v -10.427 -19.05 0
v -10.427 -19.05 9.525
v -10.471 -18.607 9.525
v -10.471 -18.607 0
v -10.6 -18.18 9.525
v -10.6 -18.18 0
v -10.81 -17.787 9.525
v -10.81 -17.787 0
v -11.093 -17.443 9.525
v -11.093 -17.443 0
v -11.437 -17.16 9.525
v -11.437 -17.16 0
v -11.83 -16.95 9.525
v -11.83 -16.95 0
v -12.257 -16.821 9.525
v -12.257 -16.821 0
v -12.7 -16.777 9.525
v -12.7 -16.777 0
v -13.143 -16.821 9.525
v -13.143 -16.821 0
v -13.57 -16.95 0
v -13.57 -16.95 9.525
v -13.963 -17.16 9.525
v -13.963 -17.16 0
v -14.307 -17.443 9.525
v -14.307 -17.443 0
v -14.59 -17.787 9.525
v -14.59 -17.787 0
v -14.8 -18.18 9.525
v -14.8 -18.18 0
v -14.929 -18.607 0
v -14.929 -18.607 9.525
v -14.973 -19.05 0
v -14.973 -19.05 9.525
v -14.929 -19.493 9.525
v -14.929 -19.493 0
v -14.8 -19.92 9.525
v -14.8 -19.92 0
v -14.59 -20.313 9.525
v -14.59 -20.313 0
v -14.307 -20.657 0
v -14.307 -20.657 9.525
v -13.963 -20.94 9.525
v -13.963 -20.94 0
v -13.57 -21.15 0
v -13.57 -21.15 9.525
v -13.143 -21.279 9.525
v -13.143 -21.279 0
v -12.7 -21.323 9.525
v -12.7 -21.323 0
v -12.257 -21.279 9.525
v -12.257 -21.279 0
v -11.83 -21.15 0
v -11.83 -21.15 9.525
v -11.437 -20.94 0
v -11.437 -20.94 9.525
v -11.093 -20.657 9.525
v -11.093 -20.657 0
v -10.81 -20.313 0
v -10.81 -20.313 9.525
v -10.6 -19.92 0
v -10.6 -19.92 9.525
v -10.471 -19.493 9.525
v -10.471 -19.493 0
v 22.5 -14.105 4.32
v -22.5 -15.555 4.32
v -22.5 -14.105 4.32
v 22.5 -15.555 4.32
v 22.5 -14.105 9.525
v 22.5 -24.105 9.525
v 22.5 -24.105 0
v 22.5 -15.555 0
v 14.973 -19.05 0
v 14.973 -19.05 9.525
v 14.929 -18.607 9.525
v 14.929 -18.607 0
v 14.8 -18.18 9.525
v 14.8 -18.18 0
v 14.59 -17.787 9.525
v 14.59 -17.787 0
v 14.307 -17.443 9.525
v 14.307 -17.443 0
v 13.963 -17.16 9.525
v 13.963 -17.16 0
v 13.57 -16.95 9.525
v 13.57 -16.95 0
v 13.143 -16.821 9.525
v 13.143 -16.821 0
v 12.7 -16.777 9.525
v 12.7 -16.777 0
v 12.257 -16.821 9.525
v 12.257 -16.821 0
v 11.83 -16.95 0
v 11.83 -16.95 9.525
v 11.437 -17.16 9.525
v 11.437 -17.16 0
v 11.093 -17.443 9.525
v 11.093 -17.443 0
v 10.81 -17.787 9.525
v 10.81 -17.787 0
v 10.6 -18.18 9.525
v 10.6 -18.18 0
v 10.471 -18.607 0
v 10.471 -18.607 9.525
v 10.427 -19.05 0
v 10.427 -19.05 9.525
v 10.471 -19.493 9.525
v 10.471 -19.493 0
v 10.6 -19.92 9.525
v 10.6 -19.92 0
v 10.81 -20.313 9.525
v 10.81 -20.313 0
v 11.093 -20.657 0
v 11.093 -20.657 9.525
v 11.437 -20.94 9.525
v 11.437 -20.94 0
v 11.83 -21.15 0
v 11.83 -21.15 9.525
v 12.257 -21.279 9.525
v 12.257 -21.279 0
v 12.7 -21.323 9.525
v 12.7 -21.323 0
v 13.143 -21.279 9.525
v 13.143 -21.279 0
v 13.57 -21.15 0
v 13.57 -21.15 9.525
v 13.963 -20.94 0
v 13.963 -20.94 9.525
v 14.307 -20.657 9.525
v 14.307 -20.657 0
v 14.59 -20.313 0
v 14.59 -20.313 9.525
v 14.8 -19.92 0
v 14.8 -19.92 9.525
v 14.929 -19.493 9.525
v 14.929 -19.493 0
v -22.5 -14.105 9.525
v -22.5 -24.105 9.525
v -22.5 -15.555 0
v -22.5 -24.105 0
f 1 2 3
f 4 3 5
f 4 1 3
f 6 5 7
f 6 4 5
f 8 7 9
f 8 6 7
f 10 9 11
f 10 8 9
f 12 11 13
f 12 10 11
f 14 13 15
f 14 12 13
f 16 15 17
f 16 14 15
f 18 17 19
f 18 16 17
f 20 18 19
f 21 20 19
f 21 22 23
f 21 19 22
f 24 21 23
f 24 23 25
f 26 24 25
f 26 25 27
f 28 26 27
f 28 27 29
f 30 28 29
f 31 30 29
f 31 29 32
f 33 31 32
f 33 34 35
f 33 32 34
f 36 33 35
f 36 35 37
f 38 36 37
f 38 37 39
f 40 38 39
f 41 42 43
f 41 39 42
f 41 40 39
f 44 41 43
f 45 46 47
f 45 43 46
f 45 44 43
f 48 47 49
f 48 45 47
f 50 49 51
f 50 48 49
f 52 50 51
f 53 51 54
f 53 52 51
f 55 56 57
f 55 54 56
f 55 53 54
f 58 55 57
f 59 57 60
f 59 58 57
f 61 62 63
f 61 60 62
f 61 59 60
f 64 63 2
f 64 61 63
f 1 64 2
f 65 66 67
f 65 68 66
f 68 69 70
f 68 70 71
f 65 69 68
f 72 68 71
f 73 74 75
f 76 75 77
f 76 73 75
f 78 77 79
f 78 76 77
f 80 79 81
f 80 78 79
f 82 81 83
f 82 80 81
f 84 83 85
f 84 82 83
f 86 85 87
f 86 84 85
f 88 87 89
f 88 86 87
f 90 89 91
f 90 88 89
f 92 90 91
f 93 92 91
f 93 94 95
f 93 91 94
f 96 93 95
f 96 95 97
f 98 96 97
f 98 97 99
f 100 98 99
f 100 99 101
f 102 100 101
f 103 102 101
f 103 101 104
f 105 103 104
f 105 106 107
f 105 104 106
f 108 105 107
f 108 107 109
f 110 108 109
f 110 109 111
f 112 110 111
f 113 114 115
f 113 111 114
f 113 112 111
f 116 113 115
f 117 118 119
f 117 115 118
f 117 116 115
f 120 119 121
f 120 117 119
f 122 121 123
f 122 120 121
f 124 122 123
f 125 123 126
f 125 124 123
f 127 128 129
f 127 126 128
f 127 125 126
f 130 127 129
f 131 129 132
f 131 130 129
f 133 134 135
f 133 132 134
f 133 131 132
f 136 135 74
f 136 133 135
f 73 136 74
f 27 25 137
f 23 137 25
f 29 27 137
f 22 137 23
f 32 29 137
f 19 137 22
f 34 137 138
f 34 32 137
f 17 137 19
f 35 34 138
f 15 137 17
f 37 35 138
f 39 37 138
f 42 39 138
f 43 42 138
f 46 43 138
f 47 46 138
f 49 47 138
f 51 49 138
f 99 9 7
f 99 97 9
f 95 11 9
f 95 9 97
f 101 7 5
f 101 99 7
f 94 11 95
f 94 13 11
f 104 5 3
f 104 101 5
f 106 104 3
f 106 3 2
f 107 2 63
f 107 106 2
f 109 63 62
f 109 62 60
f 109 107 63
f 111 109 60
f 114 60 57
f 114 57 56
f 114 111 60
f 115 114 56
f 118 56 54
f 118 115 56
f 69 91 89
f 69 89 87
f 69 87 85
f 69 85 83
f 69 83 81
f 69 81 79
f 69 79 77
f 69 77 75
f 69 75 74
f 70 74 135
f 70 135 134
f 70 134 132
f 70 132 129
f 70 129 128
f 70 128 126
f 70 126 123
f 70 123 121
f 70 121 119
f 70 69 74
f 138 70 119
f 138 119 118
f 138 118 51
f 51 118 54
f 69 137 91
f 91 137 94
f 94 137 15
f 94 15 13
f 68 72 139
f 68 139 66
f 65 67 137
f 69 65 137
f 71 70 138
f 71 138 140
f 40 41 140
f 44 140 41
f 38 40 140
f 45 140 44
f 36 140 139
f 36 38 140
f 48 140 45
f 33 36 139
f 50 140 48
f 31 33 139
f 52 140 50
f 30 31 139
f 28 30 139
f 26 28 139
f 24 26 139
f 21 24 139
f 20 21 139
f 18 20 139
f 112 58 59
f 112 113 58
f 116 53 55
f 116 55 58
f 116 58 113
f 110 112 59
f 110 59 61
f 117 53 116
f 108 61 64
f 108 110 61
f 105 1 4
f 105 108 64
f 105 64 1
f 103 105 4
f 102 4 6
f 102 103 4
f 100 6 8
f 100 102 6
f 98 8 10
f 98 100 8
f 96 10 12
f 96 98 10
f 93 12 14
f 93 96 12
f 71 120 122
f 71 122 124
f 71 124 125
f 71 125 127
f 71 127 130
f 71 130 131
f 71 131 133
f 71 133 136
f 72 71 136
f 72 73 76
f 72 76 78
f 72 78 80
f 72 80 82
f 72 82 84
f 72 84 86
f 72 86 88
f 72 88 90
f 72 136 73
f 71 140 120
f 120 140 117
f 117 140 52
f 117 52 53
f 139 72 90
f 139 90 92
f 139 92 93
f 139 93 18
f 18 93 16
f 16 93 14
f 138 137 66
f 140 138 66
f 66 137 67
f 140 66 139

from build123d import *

# Parameters (mm, degrees)
BOSS_EXTRUDE1_DEPTH  = 22.5
MOUNTHOLES_SKETCH_R  = 2.2729
MOUNTHOLES_CUT_DEPTH = 35.322392836


with BuildPart() as part:
    # yExtentCalculator_sketch → Boss-Extrude1 (new, symmetric)
    with BuildSketch(Plane(origin=(0, 0, 0), x_dir=(0, 0, -1), z_dir=(1, 0, 0))):
        Polygon((-9.525, -14.105), (-9.525, -24.105), (0, -24.105), (0, -15.555), (-4.32, -15.555), (-4.32, -14.105), align=None)
    extrude(amount=BOSS_EXTRUDE1_DEPTH, both=True)

    # mountHoles_sketch → mountHoles_cut (cut, through all)
    with BuildSketch(Plane.XY):
        with Locations((12.7, -19.05)):
            Circle(MOUNTHOLES_SKETCH_R)
        with Locations((-12.7, -19.05)):
            Circle(MOUNTHOLES_SKETCH_R)
    extrude(amount=MOUNTHOLES_CUT_DEPTH, mode=Mode.SUBTRACT)


solid = part.part
